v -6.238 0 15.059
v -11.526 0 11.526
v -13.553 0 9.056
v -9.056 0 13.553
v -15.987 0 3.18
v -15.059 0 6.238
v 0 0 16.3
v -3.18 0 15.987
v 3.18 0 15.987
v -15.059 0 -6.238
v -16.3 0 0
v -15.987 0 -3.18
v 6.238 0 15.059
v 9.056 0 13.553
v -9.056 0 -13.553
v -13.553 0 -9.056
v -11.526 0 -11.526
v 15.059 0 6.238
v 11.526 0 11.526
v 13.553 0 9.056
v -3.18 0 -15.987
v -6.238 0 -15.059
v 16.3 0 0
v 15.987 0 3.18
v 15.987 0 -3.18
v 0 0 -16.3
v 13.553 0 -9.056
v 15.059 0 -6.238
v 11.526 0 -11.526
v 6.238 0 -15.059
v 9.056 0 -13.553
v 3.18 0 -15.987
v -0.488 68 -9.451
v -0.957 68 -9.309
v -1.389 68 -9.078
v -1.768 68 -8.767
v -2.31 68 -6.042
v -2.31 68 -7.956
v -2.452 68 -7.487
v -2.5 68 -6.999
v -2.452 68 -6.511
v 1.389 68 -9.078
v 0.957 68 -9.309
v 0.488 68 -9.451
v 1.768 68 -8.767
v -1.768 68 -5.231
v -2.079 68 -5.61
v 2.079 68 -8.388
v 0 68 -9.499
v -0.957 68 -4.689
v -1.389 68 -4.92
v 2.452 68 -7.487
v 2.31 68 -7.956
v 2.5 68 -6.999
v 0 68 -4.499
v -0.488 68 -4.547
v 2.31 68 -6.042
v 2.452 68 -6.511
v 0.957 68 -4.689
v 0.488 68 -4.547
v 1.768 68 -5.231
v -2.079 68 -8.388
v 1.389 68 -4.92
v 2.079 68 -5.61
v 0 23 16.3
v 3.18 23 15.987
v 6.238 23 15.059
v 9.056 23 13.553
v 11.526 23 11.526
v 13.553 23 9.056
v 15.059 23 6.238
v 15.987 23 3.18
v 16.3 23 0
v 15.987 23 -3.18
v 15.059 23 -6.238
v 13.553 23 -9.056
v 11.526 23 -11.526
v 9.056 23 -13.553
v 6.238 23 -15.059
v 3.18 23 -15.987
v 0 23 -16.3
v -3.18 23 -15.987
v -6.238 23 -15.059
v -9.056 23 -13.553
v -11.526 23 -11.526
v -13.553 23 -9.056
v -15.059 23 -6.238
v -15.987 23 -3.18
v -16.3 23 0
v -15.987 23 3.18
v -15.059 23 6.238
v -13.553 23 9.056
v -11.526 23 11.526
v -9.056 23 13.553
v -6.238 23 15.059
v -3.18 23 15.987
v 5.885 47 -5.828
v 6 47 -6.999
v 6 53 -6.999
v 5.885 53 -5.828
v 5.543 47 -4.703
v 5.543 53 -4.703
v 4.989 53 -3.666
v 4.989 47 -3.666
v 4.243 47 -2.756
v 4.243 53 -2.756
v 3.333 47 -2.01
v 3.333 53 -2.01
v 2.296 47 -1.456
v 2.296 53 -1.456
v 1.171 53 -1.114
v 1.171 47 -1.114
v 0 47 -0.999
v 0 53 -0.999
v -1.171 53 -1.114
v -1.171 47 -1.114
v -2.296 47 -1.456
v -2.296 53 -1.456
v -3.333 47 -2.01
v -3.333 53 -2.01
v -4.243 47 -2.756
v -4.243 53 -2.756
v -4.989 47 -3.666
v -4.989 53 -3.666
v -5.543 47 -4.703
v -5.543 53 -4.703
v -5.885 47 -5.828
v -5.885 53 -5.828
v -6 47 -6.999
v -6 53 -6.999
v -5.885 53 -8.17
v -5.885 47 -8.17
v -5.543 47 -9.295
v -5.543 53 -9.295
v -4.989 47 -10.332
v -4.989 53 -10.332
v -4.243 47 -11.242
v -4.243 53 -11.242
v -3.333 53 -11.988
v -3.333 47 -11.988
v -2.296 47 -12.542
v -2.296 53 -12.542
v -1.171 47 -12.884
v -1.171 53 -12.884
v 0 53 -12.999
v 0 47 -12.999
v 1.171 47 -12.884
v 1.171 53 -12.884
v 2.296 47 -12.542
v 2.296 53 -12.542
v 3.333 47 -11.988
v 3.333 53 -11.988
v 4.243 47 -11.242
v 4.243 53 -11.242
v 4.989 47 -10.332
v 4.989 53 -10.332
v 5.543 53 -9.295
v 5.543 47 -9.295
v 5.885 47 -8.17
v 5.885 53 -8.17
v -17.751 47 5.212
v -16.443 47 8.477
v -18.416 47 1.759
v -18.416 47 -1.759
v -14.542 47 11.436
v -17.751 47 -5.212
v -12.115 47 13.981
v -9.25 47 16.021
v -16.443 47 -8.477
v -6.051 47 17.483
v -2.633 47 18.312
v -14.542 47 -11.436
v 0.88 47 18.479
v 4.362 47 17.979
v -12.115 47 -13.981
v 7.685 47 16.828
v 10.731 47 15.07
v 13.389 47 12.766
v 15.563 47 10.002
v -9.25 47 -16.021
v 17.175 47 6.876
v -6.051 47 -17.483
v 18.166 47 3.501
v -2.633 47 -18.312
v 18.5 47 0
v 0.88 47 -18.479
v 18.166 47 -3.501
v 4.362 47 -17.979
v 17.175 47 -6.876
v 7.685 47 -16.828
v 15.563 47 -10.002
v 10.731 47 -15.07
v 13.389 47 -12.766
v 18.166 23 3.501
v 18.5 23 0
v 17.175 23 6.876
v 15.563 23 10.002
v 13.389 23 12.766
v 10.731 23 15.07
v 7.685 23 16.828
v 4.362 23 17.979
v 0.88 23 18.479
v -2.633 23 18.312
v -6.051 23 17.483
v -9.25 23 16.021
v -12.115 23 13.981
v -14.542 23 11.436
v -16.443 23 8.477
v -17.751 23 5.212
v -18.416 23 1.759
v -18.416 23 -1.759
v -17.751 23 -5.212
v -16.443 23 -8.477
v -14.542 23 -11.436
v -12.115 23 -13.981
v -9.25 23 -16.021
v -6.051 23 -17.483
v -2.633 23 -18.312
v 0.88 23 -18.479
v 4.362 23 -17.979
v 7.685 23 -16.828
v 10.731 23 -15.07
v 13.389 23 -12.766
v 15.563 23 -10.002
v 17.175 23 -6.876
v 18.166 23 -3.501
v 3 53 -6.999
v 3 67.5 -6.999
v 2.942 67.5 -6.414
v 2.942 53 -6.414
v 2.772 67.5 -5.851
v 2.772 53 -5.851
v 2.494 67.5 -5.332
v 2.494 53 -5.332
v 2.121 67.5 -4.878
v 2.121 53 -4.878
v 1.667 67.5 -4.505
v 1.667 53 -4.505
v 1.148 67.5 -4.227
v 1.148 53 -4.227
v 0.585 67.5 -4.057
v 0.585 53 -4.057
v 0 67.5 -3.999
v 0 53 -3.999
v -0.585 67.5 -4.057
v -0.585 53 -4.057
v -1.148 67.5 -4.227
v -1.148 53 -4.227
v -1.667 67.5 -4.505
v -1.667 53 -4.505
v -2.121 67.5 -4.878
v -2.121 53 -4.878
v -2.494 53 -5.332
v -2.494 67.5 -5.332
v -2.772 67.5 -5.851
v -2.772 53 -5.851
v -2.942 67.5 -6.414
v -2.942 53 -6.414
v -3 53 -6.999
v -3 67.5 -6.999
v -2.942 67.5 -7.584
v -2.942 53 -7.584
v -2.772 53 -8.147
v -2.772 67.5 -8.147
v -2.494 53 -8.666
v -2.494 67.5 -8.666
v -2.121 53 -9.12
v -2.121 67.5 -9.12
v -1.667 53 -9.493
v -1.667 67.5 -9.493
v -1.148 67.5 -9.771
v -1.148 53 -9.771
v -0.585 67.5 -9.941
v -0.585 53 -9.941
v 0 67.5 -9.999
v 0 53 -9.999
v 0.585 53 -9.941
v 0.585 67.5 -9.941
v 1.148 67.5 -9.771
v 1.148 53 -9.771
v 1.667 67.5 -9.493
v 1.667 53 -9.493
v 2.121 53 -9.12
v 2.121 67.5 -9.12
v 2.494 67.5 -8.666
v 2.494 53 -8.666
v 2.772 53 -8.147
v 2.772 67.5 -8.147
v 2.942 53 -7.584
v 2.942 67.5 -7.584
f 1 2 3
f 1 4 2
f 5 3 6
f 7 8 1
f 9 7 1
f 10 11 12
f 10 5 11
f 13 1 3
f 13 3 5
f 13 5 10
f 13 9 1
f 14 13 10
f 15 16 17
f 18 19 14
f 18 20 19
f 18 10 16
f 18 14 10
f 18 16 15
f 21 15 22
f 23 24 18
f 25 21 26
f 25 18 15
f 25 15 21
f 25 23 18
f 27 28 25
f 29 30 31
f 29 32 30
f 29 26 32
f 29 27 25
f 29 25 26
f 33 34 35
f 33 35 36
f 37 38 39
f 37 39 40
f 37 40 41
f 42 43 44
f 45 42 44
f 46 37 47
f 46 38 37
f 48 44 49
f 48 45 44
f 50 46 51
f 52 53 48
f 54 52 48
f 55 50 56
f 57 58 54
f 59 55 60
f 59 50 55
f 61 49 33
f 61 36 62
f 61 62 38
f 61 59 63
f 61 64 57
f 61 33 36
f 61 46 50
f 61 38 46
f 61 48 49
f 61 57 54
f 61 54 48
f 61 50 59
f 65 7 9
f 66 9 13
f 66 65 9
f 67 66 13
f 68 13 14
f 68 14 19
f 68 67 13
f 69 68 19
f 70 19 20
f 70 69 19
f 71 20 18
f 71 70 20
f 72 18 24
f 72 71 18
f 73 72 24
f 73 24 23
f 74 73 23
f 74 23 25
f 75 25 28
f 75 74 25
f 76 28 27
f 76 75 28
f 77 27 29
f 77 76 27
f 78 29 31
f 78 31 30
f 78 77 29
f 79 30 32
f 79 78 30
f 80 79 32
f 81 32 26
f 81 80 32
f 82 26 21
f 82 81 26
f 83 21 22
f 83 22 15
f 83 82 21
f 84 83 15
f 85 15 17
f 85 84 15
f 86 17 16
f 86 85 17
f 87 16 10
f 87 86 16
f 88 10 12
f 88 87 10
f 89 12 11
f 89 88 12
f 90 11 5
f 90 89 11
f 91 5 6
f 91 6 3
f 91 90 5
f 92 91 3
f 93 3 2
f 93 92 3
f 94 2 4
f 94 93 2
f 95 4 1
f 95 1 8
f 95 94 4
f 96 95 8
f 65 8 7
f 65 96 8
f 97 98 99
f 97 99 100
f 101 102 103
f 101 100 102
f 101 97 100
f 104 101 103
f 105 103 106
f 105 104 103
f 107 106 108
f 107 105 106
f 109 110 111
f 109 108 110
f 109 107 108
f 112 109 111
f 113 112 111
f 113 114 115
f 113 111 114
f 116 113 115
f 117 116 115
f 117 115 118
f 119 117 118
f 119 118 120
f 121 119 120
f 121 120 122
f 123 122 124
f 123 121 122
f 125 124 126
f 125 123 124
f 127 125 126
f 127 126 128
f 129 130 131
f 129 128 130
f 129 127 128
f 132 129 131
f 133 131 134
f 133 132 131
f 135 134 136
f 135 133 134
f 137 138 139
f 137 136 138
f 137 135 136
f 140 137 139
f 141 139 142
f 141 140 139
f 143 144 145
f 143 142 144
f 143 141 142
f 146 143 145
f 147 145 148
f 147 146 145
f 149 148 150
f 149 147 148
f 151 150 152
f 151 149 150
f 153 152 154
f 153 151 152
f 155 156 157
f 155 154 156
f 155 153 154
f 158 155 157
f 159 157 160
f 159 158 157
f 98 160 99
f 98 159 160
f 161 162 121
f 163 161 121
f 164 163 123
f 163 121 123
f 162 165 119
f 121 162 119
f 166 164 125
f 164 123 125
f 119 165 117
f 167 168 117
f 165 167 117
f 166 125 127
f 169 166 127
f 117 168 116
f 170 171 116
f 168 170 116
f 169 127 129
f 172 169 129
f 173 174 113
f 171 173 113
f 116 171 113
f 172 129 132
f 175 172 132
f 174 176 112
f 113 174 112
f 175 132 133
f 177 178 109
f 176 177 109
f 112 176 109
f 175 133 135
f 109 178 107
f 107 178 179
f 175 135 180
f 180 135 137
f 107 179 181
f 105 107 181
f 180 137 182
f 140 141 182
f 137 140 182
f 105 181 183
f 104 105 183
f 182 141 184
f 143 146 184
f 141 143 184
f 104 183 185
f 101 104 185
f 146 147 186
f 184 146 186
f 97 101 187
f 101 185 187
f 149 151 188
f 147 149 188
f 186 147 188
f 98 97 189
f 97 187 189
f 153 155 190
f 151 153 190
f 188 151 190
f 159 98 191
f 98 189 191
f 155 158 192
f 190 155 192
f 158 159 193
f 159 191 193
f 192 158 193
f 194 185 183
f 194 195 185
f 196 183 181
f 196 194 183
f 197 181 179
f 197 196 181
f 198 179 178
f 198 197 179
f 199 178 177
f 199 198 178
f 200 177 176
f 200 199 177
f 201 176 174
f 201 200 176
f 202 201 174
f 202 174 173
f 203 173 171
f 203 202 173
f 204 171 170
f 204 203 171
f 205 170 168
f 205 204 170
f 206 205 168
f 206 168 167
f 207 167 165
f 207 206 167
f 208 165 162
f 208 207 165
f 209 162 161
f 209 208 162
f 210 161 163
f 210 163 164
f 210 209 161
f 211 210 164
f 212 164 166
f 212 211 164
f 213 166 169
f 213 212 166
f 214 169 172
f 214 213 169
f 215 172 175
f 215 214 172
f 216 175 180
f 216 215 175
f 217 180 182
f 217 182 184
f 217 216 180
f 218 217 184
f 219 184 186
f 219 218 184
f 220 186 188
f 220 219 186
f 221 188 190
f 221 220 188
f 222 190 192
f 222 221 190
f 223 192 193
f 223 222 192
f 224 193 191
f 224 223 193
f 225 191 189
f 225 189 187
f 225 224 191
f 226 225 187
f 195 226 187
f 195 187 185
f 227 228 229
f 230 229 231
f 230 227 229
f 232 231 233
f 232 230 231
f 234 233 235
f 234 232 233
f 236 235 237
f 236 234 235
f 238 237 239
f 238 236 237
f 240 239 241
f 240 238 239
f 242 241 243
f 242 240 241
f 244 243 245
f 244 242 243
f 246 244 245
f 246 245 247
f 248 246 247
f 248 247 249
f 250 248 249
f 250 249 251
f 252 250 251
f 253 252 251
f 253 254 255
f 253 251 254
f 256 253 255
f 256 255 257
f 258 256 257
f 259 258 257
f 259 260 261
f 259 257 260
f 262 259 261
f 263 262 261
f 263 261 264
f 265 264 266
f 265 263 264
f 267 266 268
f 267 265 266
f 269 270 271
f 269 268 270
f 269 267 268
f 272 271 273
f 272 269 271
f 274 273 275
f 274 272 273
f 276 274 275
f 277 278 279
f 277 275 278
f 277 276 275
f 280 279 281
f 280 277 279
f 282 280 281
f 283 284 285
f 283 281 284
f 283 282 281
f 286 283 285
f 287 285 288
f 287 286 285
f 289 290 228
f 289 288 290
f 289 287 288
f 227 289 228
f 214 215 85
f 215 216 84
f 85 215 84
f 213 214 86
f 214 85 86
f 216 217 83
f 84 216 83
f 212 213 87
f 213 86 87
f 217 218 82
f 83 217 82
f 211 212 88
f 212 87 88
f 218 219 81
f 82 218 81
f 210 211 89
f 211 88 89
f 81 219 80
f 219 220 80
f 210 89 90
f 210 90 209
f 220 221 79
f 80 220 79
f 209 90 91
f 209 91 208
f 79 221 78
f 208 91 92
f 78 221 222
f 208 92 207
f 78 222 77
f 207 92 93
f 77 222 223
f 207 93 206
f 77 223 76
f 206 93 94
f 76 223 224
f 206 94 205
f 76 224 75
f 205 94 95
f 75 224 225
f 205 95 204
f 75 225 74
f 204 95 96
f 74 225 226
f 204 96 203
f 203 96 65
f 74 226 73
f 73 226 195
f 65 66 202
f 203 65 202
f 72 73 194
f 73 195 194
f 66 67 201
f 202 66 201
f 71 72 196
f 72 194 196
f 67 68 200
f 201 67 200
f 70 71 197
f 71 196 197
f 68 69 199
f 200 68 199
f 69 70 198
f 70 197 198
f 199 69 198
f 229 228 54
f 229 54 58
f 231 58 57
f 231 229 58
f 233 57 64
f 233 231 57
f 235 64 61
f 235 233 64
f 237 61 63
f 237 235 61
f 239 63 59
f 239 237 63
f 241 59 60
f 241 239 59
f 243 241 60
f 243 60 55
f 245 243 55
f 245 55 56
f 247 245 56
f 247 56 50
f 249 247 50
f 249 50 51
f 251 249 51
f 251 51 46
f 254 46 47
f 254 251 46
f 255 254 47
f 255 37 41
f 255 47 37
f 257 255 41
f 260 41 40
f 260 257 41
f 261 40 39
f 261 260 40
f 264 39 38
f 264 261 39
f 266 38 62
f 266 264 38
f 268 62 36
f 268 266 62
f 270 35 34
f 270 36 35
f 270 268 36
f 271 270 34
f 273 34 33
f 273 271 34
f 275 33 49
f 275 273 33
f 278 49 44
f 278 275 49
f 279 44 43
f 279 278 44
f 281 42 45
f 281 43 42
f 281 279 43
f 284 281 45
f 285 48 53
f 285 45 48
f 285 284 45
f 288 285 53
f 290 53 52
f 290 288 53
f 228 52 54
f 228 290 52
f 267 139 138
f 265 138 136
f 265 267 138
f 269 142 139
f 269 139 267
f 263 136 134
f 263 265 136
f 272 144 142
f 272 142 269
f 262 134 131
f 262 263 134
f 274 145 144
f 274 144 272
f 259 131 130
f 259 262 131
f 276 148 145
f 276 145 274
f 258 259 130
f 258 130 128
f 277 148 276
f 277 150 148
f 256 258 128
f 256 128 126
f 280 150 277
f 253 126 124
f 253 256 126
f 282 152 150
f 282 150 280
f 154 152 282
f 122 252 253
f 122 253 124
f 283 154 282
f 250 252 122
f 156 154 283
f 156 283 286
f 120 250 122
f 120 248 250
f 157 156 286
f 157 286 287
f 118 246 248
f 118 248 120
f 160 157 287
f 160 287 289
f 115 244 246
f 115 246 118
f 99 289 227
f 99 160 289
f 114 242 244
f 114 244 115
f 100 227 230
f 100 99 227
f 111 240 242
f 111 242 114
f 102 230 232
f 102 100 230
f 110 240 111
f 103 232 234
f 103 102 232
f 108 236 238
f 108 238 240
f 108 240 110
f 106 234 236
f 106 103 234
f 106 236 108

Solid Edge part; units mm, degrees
sketch "Sketch1" plane through (0, 0, 0) normal (0, -1, 0) x (1, 0, 0)
  circle A0 centre (0, 0) radius 18.5
extrude "Protrusion1" add sketch "Sketch1" against normal blind 47
sketch "Sketch2" plane through (0, 47, 0) normal (0, 1, 0) x (1, 0, 0)
  circle A0 centre (0, 6.999) radius 6
extrude "ExtrudedProtrusion_2" add sketch "Sketch2" along normal blind 6
sketch "Sketch3" plane through (0, 47, 0) normal (0, 1, 0) x (1, 0, 0)
  circle A0 centre (0, 6.999) radius 3
extrude "ExtrudedProtrusion_3" add sketch "Sketch3" along normal blind 21
chamfer "Chamfer_1" distance 0.5 angle 45 1 edges at (-3, 68, -6.999)
sketch "Sketch4" plane through (0, 0, 0) normal (-1, 0, 0) x (0, -1, 0)
  line L0 (0, 16.3) -> (-23, 16.3)
  line L1 (-23, 16.3) -> (-23, 18.5)
  line L2 (-23, 18.5) -> (0, 18.5)
  line L3 (0, 18.5) -> (0, 16.3)
  dimension "D1" = 23
  dimension "D2" = 2.2
revolve "RevolvedCutout1" cut sketch "Sketch4" angle 360 about axis through (0, 0, 0) along (0, 1, 0)
